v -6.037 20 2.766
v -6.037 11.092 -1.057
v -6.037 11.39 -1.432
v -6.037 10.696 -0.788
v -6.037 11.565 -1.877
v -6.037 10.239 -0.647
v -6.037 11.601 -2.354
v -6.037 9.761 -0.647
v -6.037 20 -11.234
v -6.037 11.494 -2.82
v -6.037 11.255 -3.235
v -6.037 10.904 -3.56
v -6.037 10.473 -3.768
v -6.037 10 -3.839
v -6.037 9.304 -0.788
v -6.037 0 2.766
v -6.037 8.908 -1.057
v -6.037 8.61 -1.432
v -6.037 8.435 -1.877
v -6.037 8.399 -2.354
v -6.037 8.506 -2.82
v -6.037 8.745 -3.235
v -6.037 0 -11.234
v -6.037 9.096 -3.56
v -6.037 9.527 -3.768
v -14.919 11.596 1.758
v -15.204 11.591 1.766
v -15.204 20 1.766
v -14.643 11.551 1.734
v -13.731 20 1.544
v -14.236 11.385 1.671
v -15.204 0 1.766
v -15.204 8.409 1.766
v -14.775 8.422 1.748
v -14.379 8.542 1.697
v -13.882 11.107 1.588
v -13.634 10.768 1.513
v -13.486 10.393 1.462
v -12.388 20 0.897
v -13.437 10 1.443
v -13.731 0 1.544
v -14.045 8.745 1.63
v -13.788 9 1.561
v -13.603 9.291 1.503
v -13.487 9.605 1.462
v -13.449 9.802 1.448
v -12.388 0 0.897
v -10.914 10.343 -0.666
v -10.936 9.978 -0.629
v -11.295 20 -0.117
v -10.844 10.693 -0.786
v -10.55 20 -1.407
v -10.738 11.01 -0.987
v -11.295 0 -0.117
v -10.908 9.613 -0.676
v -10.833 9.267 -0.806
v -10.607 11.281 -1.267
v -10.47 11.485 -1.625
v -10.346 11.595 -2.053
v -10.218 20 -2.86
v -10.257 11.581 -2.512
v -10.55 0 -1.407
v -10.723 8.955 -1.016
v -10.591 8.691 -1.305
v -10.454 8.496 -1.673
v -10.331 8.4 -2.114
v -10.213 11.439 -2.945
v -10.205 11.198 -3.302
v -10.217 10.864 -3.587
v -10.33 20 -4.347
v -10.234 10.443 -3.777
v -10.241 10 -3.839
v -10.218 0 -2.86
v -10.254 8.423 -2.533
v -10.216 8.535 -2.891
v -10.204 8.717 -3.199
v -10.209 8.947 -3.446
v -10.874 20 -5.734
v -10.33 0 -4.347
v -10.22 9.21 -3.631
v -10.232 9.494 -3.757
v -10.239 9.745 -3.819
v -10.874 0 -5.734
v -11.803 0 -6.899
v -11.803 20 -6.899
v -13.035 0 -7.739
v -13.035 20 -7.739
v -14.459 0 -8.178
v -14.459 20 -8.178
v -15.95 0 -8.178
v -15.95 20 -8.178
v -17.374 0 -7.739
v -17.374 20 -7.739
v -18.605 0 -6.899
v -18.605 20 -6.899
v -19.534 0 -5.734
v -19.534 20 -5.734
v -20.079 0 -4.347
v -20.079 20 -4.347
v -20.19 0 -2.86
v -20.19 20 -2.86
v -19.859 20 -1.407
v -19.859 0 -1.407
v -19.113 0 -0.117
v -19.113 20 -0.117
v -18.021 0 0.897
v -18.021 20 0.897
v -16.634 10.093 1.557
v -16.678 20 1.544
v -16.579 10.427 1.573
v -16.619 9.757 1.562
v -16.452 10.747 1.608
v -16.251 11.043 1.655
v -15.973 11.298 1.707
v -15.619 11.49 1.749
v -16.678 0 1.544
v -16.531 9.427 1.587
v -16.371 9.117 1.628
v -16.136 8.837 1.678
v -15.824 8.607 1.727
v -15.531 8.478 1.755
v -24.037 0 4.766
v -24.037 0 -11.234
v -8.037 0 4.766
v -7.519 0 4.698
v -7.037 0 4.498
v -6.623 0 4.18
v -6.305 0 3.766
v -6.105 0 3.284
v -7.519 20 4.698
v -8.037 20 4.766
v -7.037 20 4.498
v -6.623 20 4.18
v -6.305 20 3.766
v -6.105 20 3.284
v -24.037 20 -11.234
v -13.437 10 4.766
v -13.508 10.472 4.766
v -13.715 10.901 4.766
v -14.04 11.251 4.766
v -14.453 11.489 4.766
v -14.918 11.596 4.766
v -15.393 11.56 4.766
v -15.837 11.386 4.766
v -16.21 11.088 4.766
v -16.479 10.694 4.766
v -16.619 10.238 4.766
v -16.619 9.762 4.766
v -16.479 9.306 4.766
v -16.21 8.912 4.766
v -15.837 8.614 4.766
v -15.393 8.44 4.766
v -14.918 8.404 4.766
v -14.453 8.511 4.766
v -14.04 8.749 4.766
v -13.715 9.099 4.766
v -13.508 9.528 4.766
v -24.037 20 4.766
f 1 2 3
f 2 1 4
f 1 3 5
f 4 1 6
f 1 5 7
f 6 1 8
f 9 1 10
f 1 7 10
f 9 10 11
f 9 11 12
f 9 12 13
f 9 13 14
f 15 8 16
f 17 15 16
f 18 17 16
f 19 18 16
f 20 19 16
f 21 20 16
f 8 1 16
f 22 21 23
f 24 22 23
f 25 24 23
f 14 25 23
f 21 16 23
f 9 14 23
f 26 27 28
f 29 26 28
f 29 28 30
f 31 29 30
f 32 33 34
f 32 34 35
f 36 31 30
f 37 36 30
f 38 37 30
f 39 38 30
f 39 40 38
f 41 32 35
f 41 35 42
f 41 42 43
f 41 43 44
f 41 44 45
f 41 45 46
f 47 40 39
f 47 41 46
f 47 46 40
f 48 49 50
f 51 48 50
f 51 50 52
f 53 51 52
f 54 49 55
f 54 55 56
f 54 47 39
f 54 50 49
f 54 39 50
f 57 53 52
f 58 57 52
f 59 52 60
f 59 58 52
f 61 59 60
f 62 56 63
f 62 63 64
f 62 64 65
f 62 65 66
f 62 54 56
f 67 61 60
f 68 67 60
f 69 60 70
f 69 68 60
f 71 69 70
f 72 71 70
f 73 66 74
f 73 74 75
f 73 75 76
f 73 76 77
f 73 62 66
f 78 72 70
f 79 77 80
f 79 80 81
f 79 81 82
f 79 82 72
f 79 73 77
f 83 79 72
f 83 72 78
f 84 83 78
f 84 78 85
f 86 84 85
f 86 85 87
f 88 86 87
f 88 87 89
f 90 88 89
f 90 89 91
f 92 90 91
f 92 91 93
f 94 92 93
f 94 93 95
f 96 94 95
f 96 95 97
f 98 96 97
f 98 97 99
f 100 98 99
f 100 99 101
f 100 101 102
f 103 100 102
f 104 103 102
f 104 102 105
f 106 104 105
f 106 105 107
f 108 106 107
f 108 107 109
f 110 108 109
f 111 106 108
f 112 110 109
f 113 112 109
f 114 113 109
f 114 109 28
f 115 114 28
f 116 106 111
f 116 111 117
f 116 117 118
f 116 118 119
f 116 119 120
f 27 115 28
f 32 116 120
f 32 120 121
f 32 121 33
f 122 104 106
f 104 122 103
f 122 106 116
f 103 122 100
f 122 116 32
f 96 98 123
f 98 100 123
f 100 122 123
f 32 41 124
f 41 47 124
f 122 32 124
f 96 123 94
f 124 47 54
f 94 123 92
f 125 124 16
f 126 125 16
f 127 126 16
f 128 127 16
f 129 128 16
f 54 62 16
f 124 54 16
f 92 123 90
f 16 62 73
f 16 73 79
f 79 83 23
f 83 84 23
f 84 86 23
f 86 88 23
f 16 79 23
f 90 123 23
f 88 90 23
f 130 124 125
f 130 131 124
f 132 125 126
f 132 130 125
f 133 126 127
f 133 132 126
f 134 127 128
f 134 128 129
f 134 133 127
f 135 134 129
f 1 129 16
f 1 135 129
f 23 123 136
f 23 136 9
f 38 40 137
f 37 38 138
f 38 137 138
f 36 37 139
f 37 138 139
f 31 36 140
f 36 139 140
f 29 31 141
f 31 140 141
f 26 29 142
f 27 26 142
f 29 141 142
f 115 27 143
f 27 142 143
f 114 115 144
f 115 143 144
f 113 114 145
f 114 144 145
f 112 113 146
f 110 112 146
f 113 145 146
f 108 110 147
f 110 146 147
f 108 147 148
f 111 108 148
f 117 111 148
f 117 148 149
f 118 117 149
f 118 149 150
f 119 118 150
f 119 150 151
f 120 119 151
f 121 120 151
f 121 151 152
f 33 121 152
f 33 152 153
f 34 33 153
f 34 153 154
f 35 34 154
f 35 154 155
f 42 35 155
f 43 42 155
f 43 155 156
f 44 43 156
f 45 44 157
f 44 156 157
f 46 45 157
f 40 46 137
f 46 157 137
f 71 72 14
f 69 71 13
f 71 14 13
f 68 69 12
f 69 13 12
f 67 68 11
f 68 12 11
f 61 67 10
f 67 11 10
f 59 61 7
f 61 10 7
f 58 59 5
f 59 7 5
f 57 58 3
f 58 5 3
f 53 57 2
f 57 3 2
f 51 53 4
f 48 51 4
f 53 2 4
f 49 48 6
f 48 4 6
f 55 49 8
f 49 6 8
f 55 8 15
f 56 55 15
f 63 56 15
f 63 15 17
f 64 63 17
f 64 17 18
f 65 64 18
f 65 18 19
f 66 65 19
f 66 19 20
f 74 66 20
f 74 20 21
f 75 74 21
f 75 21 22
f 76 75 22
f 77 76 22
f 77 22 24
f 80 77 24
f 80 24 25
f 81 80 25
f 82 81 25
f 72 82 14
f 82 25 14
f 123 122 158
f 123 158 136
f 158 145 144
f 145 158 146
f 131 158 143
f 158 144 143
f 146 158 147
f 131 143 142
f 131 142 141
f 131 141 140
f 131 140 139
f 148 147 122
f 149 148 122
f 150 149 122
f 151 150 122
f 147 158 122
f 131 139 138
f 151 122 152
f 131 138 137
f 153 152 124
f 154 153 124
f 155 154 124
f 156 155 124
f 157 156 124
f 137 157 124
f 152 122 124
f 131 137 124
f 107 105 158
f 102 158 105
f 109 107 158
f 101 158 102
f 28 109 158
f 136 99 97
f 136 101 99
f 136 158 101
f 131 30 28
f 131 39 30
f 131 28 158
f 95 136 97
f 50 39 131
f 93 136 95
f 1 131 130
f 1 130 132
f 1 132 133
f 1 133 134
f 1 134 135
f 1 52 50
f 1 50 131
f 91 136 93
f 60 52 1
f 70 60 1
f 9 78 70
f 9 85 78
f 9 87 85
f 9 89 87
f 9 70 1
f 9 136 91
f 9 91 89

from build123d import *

# Parameters (mm, degrees)
SKETCH1_W           = 18
SKETCH1_H           = 16
SKETCH1_R           = 5
BOSS_EXTRUDE2_DEPTH = 20
SKETCH3_R           = 1.605
CUT_EXTRUDE1_DEPTH  = 10
SKETCH4_R           = 1.6
CUT_EXTRUDE2_DEPTH  = 10
FILLET1_R           = 2


with BuildPart() as part:
    # Sketch1 → Boss-Extrude2 (new body)
    with BuildSketch(Plane(origin=(0, 0, 0), x_dir=(1, 0, 0), z_dir=(0, 1, 0))):
        with Locations((-15.037129634, 3.2340174)):
            Rectangle(SKETCH1_W, SKETCH1_H)
        with Locations(Location((-15.204317972, 3.2340174, 0), (0, 0, 270))):
            Circle(SKETCH1_R, mode=Mode.SUBTRACT)
    extrude(amount=BOSS_EXTRUDE2_DEPTH)

    # Sketch3 → Cut-Extrude1 (cut)
    with BuildSketch(Plane(origin=(-6.037129634, 0, 0), x_dir=(0, 0, -1), z_dir=(1, 0, 0))):
        with Locations((2.2340174, 10)):
            Circle(SKETCH3_R)
    extrude(amount=-CUT_EXTRUDE1_DEPTH, mode=Mode.SUBTRACT)

    # Sketch4 → Cut-Extrude2 (cut)
    with BuildSketch(Plane.XY.offset(4.7659826)):
        with Locations((-15.037129634, 10)):
            Circle(SKETCH4_R)
    extrude(amount=-CUT_EXTRUDE2_DEPTH, mode=Mode.SUBTRACT)

    # Fillet1
    fillet1_edges = [part.edges().sort_by_distance(p)[0] for p in [
        (-6.037129634, 10, 4.7659826),
    ]]
    fillet(fillet1_edges, radius=FILLET1_R)


solid = part.part
